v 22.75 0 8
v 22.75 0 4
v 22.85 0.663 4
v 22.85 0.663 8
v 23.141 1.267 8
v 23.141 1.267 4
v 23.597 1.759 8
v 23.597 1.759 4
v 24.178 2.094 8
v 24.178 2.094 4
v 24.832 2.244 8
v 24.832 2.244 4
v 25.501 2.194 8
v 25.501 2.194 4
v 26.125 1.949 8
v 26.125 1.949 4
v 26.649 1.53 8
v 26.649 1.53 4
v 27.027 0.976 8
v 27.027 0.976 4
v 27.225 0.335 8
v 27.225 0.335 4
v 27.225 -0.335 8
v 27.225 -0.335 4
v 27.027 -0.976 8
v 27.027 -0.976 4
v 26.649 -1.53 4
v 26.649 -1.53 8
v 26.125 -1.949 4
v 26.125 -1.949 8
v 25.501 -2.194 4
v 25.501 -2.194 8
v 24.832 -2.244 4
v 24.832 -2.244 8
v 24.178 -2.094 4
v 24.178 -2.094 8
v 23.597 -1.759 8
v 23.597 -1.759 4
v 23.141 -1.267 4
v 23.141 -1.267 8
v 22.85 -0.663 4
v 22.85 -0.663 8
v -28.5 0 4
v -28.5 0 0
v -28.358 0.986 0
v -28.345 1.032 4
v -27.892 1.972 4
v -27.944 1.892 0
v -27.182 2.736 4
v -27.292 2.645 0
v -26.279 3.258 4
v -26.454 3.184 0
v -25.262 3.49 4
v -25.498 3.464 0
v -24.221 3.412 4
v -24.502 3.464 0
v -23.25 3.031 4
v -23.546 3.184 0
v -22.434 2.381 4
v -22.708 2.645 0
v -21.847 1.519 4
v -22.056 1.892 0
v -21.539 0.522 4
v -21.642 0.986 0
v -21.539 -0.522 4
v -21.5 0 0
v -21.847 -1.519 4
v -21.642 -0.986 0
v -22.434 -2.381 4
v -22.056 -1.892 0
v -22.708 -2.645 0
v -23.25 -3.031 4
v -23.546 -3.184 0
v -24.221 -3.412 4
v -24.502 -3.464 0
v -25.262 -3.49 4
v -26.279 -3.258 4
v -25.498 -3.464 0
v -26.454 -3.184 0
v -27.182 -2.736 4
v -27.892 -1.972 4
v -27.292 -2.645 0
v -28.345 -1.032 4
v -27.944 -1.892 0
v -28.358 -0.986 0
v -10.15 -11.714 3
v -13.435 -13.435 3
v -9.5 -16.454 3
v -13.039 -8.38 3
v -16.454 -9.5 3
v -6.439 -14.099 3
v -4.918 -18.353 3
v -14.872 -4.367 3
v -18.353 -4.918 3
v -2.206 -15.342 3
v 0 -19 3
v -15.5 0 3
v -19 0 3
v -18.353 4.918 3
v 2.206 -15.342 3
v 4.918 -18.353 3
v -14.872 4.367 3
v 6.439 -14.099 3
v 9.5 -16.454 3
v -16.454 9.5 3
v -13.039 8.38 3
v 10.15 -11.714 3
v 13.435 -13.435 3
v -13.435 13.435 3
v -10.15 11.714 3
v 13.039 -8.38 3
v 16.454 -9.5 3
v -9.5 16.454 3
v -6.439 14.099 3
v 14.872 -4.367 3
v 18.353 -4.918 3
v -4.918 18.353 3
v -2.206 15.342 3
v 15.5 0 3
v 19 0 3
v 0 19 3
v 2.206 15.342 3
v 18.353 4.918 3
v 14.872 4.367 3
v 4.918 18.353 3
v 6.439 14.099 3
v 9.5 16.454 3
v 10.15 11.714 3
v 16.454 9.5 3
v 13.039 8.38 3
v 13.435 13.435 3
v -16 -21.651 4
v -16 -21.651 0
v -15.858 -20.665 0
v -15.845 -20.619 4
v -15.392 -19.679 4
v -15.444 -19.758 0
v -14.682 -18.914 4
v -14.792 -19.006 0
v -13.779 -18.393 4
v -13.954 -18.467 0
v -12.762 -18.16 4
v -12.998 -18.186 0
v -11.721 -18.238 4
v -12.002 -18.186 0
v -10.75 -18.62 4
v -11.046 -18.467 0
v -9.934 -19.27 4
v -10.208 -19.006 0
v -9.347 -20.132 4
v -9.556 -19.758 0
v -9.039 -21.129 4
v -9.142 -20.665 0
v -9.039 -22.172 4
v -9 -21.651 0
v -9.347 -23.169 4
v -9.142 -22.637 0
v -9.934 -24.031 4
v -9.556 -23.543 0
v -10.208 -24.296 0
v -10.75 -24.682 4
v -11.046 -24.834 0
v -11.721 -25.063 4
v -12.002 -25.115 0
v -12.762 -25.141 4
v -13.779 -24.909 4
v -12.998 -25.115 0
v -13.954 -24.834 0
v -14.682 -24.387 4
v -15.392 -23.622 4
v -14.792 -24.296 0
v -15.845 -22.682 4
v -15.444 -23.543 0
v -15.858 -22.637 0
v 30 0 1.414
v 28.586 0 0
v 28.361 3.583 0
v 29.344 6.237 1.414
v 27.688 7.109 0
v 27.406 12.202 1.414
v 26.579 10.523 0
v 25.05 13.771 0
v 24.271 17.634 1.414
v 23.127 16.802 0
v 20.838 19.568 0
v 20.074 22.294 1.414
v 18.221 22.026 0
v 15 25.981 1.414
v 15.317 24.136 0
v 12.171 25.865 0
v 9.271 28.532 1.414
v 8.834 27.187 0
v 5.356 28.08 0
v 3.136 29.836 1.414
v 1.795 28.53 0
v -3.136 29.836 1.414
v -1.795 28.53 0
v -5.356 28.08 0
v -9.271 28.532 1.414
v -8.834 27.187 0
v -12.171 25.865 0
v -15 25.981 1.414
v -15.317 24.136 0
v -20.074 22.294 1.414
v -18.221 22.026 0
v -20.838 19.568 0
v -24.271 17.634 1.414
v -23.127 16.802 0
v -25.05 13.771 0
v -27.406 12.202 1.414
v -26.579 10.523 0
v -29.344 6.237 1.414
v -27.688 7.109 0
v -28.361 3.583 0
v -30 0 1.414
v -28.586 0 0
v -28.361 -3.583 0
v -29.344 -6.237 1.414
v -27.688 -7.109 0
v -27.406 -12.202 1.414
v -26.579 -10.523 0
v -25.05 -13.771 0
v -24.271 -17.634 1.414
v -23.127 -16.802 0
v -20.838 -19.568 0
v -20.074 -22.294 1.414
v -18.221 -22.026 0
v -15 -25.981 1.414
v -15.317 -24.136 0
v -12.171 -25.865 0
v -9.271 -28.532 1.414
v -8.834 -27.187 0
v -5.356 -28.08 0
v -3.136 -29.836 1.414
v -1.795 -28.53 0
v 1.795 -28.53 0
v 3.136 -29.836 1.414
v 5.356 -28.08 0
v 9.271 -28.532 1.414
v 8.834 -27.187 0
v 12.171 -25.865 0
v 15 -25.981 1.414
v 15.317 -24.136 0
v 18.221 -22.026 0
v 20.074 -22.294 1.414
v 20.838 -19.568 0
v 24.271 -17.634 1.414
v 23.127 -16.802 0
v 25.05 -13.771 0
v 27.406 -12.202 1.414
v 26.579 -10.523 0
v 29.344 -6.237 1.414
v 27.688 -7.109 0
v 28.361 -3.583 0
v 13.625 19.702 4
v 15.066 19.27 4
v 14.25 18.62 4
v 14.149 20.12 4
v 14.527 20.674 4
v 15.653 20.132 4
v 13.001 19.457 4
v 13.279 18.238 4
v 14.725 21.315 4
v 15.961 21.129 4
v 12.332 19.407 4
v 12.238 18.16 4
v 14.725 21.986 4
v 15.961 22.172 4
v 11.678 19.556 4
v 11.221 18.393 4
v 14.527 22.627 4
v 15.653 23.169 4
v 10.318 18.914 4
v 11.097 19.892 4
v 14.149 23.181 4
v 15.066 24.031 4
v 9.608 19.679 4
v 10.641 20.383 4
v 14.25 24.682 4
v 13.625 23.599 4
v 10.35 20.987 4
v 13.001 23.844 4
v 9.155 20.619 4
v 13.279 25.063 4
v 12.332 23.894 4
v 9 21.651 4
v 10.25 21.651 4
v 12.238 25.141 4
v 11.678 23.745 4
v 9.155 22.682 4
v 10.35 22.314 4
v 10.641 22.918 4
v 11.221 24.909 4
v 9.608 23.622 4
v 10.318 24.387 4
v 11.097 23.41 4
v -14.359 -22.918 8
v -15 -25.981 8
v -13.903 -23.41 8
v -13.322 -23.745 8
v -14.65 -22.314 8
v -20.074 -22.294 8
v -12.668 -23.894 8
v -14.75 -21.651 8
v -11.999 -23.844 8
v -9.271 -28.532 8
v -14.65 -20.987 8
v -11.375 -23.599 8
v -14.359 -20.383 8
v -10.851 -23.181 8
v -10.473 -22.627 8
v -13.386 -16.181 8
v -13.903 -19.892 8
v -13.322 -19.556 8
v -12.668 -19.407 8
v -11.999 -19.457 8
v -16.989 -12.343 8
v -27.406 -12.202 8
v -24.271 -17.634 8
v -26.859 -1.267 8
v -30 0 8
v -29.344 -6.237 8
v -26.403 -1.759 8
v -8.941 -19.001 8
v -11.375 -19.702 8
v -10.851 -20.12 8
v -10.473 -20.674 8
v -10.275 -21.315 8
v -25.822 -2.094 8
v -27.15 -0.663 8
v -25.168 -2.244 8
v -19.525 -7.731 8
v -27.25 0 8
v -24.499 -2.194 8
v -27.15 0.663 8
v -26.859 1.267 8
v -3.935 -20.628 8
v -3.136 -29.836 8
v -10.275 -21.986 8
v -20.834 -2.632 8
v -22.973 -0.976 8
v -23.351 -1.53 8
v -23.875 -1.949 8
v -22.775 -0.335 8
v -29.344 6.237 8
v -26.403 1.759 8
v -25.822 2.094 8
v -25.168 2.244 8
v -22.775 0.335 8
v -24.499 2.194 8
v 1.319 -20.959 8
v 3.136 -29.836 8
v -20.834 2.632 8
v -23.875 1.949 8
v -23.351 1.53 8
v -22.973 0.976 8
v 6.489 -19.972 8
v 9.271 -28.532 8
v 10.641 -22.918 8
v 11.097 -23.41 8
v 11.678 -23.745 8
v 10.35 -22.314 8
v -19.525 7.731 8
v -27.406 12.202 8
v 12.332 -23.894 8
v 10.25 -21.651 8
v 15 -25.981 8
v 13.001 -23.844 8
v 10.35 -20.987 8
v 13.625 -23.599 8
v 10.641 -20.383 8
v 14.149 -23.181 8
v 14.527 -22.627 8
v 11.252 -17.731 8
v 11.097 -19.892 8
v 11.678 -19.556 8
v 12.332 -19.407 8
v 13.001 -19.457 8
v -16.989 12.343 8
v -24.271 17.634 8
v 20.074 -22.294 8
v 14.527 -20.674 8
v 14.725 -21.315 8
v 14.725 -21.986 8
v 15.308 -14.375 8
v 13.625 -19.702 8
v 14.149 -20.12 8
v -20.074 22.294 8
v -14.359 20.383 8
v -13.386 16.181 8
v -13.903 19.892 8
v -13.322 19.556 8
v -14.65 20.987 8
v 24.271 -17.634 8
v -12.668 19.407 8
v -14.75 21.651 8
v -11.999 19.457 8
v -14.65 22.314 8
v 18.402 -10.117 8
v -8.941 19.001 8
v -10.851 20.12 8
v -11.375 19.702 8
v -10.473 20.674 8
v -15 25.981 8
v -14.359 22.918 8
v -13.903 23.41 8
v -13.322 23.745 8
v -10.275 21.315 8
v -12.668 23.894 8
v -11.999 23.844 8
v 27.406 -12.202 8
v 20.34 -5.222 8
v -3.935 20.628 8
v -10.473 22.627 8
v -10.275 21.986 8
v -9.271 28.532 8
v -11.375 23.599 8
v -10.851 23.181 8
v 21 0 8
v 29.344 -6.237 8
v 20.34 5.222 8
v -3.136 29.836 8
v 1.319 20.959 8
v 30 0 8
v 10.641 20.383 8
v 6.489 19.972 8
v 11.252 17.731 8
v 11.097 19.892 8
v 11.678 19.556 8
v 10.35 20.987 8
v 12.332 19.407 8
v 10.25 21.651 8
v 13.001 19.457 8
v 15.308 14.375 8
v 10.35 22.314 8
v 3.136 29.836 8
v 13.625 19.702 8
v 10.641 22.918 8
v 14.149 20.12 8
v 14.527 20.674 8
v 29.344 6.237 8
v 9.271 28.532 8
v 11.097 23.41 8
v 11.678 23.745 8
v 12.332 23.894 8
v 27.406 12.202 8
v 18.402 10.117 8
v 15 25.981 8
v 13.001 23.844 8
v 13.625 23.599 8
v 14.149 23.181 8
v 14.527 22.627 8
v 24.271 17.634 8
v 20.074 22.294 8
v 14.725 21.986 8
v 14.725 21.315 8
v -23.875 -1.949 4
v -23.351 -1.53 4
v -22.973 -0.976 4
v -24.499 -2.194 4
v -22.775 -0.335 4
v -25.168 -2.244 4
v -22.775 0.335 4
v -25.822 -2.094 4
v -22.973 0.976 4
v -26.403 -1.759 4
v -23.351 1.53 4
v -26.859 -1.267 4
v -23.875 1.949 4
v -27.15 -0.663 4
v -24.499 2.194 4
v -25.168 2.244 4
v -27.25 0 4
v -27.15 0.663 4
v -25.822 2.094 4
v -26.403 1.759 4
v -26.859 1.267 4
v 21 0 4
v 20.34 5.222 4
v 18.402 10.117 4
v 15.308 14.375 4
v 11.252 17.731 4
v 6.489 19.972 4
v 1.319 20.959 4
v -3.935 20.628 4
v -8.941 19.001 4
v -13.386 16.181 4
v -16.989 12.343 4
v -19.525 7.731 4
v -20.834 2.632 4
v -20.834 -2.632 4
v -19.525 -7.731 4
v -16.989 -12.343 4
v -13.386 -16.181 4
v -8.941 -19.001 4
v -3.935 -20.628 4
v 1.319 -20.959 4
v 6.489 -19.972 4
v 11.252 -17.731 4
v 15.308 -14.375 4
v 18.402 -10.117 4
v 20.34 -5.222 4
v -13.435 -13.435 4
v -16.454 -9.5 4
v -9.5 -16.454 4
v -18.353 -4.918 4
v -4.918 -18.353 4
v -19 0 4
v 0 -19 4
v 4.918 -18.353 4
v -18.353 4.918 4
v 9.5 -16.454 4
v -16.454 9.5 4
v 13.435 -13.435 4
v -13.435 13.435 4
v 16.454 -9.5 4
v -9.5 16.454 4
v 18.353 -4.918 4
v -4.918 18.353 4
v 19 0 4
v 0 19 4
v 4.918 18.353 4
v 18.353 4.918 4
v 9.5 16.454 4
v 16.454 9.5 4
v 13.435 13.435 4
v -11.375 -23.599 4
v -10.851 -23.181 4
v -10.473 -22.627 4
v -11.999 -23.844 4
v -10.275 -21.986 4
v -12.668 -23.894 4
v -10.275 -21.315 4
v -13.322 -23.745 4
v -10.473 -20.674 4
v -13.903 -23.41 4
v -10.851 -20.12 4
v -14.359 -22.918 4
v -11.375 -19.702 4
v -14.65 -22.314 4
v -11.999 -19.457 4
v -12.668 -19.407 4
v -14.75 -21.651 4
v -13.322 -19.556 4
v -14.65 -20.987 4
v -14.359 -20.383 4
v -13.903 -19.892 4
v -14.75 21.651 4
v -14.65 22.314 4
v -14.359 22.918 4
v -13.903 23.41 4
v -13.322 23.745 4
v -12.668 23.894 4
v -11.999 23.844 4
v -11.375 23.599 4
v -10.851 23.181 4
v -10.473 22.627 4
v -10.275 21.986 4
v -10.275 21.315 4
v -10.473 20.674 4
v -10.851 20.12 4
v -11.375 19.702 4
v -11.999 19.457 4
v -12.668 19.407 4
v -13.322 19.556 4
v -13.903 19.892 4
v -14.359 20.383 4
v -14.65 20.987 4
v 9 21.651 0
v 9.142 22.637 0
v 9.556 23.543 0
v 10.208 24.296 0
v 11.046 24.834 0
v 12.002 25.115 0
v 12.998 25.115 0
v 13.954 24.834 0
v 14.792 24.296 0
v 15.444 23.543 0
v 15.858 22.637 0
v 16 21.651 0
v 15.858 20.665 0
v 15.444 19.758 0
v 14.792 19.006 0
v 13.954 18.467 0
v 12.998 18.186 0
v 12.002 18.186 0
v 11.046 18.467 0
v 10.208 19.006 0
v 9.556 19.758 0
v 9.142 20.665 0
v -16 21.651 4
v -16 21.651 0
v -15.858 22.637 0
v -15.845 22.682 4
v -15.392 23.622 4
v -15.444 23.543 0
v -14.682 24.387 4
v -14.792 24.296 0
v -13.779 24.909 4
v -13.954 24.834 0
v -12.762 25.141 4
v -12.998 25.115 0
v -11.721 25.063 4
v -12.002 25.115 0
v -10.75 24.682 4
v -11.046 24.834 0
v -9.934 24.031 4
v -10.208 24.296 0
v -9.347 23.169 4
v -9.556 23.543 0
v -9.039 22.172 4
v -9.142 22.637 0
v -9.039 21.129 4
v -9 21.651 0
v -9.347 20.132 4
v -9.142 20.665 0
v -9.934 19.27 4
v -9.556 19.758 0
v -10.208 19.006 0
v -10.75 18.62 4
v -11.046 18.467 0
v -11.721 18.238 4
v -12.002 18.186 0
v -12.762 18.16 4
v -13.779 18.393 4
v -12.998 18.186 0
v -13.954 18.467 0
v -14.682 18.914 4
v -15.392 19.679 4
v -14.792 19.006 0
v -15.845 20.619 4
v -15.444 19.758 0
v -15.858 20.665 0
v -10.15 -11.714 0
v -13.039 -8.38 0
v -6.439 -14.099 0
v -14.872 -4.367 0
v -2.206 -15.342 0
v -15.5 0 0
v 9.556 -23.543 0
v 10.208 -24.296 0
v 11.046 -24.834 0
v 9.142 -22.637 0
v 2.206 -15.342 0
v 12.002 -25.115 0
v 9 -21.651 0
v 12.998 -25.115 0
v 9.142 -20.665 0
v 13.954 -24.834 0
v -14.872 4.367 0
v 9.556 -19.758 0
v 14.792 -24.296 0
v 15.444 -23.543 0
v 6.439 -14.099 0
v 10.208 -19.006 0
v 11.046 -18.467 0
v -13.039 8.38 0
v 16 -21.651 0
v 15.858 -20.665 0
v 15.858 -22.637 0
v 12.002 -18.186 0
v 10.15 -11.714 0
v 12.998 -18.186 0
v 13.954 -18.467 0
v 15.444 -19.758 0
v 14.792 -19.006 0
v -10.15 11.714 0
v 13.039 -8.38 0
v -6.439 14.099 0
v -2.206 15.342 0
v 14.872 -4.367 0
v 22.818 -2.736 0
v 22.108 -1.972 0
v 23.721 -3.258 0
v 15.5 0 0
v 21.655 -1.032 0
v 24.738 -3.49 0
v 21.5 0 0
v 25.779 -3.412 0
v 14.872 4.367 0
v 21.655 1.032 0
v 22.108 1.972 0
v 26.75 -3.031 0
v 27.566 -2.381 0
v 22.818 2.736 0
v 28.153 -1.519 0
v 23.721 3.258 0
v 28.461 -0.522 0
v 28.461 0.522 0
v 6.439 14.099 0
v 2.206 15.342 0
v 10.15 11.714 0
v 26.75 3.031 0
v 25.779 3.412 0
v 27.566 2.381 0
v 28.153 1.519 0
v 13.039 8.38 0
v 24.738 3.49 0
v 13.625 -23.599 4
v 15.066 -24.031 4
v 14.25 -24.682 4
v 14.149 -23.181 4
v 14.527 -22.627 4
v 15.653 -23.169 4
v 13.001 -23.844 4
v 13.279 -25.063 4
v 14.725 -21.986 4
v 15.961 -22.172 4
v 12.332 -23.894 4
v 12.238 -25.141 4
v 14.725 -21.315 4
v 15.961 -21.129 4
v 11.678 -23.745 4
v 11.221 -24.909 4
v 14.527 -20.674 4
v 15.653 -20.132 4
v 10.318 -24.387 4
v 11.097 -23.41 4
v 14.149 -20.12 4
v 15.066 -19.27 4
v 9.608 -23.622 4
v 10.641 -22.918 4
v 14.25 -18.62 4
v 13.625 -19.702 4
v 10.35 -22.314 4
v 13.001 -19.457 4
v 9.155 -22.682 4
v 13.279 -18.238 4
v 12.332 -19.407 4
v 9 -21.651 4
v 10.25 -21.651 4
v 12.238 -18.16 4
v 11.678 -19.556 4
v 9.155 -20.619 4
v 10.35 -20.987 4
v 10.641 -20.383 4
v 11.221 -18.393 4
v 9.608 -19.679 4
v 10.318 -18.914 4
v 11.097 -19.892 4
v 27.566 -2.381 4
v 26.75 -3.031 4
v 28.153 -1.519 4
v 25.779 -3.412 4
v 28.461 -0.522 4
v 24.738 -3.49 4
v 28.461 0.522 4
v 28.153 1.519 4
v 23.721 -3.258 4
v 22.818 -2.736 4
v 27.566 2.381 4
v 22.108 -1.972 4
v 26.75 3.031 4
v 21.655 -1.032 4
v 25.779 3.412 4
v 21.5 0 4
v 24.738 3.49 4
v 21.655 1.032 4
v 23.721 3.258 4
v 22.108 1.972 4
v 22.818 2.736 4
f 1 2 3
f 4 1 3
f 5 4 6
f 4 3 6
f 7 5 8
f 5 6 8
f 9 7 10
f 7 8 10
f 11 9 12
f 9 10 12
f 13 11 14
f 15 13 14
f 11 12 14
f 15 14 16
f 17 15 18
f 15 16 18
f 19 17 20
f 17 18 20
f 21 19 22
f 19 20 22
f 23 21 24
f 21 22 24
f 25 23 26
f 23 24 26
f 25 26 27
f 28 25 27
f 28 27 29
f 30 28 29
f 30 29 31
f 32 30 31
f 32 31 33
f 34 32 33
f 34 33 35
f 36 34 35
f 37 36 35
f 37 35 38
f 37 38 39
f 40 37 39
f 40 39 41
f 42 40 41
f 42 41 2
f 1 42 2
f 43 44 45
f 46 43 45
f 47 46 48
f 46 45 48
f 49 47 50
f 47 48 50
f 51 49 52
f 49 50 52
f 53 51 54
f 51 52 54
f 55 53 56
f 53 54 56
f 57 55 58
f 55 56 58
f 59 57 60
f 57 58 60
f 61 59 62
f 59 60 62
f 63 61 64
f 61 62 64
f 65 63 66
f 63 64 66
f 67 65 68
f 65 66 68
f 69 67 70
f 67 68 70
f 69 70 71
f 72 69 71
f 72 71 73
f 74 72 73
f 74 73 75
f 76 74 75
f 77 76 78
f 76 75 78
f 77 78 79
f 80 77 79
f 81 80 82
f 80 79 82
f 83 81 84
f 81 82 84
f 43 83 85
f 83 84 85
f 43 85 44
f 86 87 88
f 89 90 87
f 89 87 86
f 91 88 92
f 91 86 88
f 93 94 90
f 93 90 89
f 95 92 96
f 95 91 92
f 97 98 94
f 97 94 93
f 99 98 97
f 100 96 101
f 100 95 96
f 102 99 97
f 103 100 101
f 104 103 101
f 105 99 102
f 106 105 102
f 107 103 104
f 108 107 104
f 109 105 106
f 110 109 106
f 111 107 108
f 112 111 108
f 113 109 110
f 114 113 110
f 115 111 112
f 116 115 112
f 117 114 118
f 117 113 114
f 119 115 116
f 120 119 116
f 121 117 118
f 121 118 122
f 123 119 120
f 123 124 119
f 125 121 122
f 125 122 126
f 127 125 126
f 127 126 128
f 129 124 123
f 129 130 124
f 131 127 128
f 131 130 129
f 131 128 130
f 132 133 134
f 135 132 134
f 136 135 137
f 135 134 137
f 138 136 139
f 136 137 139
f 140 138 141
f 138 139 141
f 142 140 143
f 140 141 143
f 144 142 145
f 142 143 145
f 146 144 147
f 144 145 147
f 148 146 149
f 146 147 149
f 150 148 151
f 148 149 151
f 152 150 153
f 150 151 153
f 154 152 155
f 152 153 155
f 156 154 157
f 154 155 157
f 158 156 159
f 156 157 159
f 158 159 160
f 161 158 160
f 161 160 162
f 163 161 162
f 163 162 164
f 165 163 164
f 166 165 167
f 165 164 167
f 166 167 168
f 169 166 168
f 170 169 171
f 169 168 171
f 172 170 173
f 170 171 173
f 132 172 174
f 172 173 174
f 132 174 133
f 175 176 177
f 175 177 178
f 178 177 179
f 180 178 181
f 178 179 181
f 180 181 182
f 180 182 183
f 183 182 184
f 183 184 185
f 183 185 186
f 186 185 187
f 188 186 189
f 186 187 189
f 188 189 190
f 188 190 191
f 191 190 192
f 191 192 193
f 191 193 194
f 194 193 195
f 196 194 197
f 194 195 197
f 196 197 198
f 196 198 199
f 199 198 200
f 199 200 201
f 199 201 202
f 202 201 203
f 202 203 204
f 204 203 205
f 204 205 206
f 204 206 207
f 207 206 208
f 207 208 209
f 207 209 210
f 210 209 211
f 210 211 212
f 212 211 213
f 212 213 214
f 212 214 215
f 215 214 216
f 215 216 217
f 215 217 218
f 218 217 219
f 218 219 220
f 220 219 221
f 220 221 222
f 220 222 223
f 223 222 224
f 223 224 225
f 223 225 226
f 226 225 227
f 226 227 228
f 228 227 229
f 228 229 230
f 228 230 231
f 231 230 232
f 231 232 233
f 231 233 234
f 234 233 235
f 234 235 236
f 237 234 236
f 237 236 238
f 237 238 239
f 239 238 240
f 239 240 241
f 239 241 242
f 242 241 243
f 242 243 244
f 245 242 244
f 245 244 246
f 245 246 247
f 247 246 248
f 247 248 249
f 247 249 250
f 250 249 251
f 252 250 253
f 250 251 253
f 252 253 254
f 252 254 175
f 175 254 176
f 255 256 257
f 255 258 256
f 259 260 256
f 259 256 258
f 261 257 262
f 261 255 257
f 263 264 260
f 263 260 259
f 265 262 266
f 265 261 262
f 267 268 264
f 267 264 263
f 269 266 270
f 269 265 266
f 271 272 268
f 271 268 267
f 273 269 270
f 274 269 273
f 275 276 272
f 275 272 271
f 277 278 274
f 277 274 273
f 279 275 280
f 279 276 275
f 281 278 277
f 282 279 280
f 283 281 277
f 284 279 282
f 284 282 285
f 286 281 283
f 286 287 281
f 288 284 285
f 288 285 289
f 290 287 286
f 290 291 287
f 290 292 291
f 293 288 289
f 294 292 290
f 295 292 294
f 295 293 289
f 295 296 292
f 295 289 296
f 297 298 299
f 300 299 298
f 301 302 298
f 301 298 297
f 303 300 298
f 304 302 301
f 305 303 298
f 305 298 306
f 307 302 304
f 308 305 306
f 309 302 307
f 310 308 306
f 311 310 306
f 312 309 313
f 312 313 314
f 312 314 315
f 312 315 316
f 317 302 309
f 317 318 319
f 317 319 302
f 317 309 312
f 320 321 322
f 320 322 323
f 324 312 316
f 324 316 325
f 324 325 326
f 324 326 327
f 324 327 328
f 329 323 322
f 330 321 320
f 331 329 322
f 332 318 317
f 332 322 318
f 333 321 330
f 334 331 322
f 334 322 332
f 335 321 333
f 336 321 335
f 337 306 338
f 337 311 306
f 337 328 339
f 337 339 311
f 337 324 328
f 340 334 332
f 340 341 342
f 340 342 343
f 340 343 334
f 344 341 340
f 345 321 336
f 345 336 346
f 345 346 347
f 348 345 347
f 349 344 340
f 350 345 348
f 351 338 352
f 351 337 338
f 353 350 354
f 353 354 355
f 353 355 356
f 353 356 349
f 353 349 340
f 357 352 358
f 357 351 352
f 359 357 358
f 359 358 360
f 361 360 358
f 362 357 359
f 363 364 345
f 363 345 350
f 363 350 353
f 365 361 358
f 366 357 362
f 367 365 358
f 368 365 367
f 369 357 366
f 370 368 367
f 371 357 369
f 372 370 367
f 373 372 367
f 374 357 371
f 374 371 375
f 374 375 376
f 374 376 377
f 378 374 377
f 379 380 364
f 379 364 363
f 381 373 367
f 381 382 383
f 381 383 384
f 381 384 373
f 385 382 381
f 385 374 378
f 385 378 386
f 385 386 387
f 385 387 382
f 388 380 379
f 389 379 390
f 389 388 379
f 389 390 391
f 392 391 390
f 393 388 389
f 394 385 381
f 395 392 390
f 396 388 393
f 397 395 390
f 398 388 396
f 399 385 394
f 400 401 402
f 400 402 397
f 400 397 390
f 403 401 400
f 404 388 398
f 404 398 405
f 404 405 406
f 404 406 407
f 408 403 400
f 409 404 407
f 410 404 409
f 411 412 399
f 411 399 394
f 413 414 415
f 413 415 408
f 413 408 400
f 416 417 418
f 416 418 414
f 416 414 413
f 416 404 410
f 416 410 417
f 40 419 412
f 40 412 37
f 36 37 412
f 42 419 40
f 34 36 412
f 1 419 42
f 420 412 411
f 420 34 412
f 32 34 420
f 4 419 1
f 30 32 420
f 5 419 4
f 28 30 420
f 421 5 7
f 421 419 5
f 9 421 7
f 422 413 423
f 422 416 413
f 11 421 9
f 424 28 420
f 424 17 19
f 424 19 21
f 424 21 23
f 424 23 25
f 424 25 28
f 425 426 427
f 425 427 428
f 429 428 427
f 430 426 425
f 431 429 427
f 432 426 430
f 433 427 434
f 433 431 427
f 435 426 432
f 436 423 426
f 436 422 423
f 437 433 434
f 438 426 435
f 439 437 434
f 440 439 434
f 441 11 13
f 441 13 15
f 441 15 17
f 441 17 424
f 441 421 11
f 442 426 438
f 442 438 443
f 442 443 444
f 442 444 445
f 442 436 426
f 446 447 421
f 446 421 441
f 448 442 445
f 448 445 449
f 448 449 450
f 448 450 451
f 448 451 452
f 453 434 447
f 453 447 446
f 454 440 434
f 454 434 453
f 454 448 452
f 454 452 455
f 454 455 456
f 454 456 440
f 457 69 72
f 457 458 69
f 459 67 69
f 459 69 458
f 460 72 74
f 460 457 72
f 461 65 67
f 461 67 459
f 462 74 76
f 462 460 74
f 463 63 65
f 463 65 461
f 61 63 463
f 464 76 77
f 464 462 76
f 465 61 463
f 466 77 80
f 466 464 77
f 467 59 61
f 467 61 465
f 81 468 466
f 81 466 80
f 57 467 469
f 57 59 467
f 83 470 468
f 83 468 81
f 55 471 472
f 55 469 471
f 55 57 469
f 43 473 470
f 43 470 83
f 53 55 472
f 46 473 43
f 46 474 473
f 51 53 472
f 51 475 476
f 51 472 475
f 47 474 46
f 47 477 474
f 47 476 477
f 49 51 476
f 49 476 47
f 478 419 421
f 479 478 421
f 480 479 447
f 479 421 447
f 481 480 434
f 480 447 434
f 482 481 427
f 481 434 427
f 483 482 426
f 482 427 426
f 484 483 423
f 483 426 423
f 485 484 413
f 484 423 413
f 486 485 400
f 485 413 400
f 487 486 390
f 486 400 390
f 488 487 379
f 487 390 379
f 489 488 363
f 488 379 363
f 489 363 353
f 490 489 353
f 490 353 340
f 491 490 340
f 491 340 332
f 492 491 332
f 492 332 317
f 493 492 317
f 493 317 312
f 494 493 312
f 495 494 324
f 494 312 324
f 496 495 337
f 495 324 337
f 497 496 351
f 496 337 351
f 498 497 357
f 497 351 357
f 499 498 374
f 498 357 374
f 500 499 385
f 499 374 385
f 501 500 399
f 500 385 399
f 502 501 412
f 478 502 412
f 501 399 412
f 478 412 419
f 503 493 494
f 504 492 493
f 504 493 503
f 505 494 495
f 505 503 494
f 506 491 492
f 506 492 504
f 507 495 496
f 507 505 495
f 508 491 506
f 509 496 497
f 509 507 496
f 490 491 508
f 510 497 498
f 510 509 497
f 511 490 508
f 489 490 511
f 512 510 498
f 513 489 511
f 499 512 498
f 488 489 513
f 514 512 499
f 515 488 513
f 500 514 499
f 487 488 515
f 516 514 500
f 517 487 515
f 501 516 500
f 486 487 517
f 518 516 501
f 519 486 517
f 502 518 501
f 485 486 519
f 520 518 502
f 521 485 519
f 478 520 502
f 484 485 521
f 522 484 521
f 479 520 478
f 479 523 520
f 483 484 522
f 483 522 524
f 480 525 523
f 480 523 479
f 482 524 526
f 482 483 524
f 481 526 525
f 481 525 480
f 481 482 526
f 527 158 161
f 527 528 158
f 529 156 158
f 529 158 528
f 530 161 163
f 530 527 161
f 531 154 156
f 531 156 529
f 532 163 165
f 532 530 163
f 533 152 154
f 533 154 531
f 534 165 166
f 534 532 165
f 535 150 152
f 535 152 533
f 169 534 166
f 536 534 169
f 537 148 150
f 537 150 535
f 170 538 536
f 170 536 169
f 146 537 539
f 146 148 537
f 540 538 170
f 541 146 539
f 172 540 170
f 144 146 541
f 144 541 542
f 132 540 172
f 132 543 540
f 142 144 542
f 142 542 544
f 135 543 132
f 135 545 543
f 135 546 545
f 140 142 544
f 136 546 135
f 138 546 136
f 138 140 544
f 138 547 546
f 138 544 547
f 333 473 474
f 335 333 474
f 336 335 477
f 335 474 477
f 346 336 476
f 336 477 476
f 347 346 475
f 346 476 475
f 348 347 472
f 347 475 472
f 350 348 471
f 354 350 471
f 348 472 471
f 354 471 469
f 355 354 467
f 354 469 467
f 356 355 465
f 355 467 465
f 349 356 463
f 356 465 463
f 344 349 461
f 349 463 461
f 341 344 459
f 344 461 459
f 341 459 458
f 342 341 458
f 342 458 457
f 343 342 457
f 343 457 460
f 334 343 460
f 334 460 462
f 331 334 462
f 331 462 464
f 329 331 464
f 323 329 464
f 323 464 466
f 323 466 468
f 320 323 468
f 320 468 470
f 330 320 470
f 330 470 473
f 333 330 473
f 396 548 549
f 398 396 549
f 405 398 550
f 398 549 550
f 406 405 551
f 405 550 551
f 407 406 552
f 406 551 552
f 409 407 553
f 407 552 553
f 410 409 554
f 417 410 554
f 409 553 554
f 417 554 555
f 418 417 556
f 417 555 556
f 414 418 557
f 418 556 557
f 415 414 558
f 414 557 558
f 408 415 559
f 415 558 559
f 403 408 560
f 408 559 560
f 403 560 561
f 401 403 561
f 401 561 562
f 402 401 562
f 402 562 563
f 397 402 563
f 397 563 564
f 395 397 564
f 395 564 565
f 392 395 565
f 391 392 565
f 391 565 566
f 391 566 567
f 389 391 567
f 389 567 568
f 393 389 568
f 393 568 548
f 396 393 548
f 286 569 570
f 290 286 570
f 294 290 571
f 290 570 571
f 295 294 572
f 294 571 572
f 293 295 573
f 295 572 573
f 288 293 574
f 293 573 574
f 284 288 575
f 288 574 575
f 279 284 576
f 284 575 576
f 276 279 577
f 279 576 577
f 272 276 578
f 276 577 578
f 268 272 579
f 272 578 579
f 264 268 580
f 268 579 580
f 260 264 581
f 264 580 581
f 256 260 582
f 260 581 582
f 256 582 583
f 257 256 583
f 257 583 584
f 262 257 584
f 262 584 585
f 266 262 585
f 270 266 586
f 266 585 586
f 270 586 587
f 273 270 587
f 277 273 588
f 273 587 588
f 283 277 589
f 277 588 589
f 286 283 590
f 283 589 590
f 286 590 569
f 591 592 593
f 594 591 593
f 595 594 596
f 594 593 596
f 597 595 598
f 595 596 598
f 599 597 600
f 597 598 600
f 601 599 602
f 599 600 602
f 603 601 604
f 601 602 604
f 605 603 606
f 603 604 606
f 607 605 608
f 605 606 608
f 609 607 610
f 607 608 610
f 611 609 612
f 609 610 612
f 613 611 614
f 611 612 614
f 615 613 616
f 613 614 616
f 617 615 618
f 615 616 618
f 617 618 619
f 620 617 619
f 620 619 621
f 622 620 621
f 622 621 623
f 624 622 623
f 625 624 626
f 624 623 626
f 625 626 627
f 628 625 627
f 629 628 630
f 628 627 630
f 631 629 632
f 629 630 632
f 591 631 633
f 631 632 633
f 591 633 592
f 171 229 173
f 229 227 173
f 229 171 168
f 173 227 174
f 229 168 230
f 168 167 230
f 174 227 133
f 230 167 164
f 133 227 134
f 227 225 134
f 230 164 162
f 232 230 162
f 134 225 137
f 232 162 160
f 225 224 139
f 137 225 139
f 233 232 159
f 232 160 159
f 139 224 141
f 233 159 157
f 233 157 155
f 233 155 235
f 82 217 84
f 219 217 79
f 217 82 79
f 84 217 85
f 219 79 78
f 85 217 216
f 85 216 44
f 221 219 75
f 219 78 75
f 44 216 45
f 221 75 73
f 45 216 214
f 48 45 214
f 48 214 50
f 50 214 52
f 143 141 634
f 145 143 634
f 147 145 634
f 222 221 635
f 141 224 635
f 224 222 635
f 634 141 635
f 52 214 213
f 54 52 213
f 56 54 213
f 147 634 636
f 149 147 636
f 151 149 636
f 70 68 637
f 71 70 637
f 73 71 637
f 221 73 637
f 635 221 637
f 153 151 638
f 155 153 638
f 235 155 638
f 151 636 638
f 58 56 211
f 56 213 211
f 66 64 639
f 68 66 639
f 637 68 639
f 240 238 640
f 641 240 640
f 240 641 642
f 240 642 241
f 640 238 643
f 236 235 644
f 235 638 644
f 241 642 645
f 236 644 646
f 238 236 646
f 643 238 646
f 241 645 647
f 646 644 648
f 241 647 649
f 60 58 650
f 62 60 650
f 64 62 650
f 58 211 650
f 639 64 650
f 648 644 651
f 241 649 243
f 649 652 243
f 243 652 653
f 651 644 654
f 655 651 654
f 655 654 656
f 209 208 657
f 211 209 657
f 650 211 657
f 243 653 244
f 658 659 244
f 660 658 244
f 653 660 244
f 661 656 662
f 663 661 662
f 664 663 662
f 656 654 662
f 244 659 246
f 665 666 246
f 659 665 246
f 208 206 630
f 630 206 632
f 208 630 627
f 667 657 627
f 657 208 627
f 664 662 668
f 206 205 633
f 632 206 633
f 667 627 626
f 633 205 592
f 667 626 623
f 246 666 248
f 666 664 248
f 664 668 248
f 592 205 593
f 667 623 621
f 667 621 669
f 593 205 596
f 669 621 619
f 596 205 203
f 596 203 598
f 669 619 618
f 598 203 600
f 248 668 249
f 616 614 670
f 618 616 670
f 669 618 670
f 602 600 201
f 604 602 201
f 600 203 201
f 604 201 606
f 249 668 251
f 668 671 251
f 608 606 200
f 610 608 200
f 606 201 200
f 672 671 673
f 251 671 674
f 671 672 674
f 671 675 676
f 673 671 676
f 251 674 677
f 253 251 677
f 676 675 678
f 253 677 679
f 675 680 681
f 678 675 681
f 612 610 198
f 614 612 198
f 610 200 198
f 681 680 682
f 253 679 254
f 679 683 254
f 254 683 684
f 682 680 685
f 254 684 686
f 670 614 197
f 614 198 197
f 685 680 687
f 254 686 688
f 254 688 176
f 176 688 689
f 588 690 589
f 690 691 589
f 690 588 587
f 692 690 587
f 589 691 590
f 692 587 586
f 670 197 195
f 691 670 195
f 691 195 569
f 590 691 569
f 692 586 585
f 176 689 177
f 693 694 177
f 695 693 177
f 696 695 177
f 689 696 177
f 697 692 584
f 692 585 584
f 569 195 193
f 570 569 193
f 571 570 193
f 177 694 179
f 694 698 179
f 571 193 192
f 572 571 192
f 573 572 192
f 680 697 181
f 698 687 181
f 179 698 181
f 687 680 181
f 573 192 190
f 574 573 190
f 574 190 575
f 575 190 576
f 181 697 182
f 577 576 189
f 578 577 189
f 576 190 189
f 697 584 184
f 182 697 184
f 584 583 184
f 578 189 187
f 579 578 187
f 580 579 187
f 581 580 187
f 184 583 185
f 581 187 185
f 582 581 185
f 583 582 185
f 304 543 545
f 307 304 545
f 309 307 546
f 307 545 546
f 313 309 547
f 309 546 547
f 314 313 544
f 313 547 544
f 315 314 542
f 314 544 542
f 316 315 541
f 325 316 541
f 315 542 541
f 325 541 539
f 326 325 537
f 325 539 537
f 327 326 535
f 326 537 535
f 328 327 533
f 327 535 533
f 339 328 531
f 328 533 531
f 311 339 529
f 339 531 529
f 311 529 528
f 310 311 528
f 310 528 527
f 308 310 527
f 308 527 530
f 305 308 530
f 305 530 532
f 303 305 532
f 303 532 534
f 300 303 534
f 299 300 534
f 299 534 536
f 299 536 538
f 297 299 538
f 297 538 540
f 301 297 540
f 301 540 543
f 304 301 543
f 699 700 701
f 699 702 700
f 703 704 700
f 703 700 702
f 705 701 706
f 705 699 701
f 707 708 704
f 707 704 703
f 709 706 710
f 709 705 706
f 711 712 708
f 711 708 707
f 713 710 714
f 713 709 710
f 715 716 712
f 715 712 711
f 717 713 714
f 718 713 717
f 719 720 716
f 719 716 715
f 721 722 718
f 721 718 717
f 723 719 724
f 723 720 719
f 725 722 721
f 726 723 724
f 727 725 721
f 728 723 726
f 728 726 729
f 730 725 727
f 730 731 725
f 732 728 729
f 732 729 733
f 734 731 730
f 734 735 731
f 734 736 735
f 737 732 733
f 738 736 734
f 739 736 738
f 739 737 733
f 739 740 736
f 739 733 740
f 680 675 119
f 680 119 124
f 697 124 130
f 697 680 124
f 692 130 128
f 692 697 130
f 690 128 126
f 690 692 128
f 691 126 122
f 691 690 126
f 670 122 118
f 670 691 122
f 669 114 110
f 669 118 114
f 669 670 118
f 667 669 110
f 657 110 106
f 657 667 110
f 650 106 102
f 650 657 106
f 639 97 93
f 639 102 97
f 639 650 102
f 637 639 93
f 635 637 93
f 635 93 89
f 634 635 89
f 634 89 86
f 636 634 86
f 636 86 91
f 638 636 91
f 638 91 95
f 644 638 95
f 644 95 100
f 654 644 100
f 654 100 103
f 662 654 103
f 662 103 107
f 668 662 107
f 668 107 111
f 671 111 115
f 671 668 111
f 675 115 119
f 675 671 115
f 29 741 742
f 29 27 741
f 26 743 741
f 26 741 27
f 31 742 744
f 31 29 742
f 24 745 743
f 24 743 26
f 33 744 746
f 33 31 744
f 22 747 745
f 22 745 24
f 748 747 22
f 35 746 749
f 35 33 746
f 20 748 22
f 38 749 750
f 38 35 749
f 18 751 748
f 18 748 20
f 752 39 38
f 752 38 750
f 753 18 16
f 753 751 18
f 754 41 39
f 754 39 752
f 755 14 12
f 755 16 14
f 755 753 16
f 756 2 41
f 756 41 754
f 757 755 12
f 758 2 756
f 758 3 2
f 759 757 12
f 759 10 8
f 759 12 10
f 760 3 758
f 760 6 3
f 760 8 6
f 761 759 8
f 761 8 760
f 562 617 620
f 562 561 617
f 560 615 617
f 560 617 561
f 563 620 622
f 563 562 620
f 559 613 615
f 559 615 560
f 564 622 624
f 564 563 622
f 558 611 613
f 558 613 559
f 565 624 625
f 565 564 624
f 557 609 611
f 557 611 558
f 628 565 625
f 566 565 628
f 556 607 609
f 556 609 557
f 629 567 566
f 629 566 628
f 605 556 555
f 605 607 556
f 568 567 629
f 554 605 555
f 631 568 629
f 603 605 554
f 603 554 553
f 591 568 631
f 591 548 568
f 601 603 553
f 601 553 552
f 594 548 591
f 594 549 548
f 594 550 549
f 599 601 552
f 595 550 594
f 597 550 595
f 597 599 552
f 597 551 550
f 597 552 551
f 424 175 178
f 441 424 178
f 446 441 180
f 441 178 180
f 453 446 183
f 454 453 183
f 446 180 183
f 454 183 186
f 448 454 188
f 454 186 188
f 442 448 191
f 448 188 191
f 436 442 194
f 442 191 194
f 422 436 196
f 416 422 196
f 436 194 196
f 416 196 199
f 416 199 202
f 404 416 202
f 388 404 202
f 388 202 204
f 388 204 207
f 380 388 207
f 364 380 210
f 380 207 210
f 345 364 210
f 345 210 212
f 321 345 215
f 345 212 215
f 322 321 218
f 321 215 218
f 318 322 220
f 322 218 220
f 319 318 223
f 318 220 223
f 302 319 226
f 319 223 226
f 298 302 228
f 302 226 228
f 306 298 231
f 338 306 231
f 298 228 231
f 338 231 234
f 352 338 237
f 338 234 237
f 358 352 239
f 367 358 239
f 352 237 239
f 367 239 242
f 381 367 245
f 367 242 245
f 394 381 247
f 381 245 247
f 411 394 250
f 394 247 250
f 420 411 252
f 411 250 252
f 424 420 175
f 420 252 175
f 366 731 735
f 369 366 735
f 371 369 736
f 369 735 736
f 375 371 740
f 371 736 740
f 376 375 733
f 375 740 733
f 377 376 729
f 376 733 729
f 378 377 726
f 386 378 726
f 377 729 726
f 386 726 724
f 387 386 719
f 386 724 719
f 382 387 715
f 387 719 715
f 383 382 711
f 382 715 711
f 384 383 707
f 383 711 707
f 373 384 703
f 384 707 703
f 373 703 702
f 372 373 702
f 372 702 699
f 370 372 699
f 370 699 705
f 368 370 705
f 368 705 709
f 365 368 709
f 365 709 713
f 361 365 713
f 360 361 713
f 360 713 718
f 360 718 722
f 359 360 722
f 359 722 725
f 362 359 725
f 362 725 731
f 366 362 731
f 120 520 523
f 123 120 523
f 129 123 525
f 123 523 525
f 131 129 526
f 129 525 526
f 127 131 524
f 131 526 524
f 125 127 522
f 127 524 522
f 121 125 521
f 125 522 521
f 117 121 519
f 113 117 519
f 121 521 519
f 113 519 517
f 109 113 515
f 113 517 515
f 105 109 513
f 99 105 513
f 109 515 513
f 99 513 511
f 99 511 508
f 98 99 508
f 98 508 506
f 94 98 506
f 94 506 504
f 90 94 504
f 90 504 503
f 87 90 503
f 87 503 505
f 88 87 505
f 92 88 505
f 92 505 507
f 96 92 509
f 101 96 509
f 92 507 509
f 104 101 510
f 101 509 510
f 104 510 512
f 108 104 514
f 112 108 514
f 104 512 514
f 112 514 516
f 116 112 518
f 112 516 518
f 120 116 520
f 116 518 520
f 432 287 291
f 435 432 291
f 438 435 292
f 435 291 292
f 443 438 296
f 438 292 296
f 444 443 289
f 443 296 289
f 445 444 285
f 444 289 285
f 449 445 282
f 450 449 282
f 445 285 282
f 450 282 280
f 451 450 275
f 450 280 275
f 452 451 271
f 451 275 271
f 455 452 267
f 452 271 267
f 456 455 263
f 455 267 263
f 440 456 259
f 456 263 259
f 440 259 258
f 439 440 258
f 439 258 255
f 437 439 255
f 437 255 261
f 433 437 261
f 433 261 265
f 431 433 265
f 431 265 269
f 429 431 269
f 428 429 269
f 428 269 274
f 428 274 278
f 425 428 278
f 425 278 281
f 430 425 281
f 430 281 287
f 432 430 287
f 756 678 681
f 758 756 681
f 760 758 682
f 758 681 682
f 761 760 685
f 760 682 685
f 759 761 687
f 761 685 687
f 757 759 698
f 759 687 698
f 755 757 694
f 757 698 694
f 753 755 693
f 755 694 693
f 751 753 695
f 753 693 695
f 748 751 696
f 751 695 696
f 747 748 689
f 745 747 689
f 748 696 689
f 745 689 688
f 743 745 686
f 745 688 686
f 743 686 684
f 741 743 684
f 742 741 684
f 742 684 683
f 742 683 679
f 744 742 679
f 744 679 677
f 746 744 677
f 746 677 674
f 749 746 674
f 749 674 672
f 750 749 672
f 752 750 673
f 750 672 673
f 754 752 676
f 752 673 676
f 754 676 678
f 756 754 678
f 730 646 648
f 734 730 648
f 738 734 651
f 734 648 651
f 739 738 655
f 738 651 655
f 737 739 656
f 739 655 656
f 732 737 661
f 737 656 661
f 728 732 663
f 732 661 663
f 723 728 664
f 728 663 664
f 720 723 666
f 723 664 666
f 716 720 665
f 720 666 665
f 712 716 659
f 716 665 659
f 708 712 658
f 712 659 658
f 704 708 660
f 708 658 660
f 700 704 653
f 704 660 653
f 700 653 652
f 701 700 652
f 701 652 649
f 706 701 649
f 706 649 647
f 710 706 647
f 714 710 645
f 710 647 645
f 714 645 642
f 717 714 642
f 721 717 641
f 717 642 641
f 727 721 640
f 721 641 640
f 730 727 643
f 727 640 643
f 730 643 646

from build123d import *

# Parameters (mm, degrees)
SKETCH_1_R          = 30
SKETCH_1_R_2        = 15.5
EXTRUDE_1_DEPTH     = 8
SKETCH_2_R          = 21
CUT_EXTRUDE_1_DEPTH = 4
SKETCH_3_R          = 19
CUT_EXTRUDE_2_DEPTH = 1
SKETCH_4_R          = 2.25
CUT_EXTRUDE_3_DEPTH = 44.17406629
SKETCH_5_R          = 3.5
CUT_EXTRUDE_4_DEPTH = 4
CHAMFER_1_SIZE      = 1.414


with BuildPart() as part:
    # 草图1 → 拉伸1 (new body)
    with BuildSketch(Plane.XY):
        Circle(SKETCH_1_R)
        Circle(SKETCH_1_R_2, mode=Mode.SUBTRACT)
    extrude(amount=EXTRUDE_1_DEPTH)

    # 草图2 → 切除-拉伸1 (cut)
    with BuildSketch(Plane.XY.offset(8)):
        Circle(SKETCH_2_R)
    extrude(amount=-CUT_EXTRUDE_1_DEPTH, mode=Mode.SUBTRACT)

    # 草图3 → 切除-拉伸2 (cut)
    with BuildSketch(Plane.XY.offset(4)):
        Circle(SKETCH_3_R)
    extrude(amount=-CUT_EXTRUDE_2_DEPTH, mode=Mode.SUBTRACT)

    # 草图4 → 切除-拉伸3 (cut, through all)
    with BuildSketch(Plane(origin=(0, 0, 0), x_dir=(-1, 0, 0), z_dir=(0, 0, -1))):
        with Locations((12.5, 21.650635095)):
            Circle(SKETCH_4_R)
        with Locations((-12.5, 21.650635095)):
            Circle(SKETCH_4_R)
        with Locations((-25, 0)):
            Circle(SKETCH_4_R)
        with Locations((-12.5, -21.650635095)):
            Circle(SKETCH_4_R)
        with Locations((12.5, -21.650635095)):
            Circle(SKETCH_4_R)
        with Locations((25, 0)):
            Circle(SKETCH_4_R)
    extrude(amount=-CUT_EXTRUDE_3_DEPTH, mode=Mode.SUBTRACT)

    # 草图5 → 切除-拉伸4 (cut)
    with BuildSketch(Plane(origin=(0, 0, 0), x_dir=(-1, 0, 0), z_dir=(0, 0, -1))):
        with Locations((-12.5, 21.650635095)):
            Circle(SKETCH_5_R)
        with Locations((-25, 0)):
            Circle(SKETCH_5_R)
        with Locations((-12.5, -21.650635095)):
            Circle(SKETCH_5_R)
        with Locations((12.5, -21.650635095)):
            Circle(SKETCH_5_R)
        with Locations((25, 0)):
            Circle(SKETCH_5_R)
        with Locations((12.5, 21.650635095)):
            Circle(SKETCH_5_R)
    extrude(amount=-CUT_EXTRUDE_4_DEPTH, mode=Mode.SUBTRACT)

    # 倒角1
    chamfer_1_edges = [part.edges().sort_by_distance(p)[0] for p in [
        (-30, 0, 0),
    ]]
    chamfer(chamfer_1_edges, length=CHAMFER_1_SIZE)


solid = part.part
